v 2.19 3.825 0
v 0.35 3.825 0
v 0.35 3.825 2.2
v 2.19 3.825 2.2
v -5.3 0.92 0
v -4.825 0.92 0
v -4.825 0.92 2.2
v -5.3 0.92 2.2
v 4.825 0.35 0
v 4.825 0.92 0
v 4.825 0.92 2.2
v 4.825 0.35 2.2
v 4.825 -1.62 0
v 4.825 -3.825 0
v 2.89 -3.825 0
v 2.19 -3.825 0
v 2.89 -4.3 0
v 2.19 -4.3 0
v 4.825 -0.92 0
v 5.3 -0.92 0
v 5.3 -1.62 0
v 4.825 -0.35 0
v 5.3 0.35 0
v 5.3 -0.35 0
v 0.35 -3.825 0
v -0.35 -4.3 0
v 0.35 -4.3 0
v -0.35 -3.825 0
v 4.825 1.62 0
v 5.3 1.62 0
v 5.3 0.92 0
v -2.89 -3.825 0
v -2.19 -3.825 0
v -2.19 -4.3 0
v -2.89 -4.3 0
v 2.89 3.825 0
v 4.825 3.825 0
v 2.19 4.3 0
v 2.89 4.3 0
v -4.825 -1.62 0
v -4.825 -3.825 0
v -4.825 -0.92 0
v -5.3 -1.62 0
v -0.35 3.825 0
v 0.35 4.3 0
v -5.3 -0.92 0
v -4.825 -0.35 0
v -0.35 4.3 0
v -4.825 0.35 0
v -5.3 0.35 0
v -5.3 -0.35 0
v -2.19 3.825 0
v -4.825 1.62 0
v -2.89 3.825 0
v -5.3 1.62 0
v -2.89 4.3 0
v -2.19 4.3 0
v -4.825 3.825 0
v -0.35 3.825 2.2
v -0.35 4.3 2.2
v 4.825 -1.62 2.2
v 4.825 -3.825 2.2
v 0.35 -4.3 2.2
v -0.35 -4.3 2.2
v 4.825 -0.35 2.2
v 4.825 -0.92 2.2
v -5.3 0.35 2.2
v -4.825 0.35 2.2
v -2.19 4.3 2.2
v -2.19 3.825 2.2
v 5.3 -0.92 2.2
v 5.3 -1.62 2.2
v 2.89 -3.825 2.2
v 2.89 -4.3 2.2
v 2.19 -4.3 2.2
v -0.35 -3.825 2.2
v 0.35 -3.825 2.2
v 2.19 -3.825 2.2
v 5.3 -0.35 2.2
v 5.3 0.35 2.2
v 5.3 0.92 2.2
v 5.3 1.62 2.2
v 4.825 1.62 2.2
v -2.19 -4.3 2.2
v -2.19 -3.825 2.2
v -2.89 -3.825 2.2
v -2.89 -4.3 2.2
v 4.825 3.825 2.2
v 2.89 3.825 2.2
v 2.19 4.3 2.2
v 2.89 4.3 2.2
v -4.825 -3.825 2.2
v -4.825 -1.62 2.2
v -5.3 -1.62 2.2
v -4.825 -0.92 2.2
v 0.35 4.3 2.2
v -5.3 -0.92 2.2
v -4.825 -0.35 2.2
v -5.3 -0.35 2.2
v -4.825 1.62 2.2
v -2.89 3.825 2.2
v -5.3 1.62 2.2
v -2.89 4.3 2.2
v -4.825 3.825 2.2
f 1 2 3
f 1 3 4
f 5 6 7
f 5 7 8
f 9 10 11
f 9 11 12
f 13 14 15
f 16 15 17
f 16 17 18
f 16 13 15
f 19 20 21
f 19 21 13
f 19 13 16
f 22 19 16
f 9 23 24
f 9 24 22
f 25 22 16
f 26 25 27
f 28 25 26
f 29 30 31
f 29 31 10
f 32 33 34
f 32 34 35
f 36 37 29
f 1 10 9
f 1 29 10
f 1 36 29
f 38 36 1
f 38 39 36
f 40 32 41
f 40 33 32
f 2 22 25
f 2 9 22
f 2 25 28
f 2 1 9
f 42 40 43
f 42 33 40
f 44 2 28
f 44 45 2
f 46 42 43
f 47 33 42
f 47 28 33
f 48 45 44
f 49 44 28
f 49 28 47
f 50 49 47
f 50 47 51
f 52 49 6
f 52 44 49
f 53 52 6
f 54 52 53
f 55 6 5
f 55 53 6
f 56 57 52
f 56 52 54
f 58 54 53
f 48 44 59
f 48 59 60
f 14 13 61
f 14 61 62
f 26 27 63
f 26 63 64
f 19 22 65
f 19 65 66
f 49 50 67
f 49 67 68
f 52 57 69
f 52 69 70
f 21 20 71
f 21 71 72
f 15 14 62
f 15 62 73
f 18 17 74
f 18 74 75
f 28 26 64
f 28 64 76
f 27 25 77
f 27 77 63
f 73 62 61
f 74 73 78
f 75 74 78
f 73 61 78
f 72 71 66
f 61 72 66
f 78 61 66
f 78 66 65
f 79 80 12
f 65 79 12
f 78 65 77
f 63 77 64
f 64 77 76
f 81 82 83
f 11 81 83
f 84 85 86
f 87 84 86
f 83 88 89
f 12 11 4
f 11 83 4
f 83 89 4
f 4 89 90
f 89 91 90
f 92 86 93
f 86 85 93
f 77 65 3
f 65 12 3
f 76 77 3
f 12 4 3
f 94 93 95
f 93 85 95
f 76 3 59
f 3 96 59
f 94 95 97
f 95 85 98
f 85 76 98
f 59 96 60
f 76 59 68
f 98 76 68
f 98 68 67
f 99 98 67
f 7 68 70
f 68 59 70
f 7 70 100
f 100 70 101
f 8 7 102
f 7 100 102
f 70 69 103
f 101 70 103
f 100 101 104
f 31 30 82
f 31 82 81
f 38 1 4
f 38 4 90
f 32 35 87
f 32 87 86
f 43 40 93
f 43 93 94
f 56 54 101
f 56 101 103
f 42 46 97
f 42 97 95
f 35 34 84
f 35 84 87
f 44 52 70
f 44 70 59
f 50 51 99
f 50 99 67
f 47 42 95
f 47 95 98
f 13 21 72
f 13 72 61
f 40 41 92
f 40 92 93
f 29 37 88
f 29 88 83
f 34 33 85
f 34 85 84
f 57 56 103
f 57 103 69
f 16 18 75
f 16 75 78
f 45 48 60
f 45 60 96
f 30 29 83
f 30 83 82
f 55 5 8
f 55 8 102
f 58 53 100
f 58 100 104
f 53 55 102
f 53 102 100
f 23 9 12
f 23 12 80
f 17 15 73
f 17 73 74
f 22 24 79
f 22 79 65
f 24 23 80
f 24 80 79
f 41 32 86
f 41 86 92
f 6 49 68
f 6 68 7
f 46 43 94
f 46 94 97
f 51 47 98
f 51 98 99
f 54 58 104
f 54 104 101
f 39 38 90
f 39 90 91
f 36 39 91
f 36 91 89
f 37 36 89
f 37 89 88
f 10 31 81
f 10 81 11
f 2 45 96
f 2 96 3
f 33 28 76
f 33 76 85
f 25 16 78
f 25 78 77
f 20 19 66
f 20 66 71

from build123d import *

# Parameters (mm, degrees)
COMPONENT_OUTLINE_DEPTH = 2.2


with BuildPart() as part:
    # 草图1 → Component_Outline (new body)
    with BuildSketch(Plane.XY):
        Polygon((-2.89, -4.3), (-2.89, -3.825), (-4.825, -3.825), (-4.825, -1.62), (-5.3, -1.62), (-5.3, -0.92), (-4.825, -0.92), (-4.825, -0.35), (-5.3, -0.35), (-5.3, 0.35), (-4.825, 0.35), (-4.825, 0.92), (-5.3, 0.92), (-5.3, 1.62), (-4.825, 1.62), (-4.825, 3.825), (-2.89, 3.825), (-2.89, 4.3), (-2.19, 4.3), (-2.19, 3.825), (-0.35, 3.825), (-0.35, 4.3), (0.35, 4.3), (0.35, 3.825), (2.19, 3.825), (2.19, 4.3), (2.89, 4.3), (2.89, 3.825), (4.825, 3.825), (4.825, 1.62), (5.3, 1.62), (5.3, 0.92), (4.825, 0.92), (4.825, 0.35), (5.3, 0.35), (5.3, -0.35), (4.825, -0.35), (4.825, -0.92), (5.3, -0.92), (5.3, -1.62), (4.825, -1.62), (4.825, -3.825), (2.89, -3.825), (2.89, -4.3), (2.19, -4.3), (2.19, -3.825), (0.35, -3.825), (0.35, -4.3), (-0.35, -4.3), (-0.35, -3.825), (-2.19, -3.825), (-2.19, -4.3), align=None)
    extrude(amount=COMPONENT_OUTLINE_DEPTH)


solid = part.part
